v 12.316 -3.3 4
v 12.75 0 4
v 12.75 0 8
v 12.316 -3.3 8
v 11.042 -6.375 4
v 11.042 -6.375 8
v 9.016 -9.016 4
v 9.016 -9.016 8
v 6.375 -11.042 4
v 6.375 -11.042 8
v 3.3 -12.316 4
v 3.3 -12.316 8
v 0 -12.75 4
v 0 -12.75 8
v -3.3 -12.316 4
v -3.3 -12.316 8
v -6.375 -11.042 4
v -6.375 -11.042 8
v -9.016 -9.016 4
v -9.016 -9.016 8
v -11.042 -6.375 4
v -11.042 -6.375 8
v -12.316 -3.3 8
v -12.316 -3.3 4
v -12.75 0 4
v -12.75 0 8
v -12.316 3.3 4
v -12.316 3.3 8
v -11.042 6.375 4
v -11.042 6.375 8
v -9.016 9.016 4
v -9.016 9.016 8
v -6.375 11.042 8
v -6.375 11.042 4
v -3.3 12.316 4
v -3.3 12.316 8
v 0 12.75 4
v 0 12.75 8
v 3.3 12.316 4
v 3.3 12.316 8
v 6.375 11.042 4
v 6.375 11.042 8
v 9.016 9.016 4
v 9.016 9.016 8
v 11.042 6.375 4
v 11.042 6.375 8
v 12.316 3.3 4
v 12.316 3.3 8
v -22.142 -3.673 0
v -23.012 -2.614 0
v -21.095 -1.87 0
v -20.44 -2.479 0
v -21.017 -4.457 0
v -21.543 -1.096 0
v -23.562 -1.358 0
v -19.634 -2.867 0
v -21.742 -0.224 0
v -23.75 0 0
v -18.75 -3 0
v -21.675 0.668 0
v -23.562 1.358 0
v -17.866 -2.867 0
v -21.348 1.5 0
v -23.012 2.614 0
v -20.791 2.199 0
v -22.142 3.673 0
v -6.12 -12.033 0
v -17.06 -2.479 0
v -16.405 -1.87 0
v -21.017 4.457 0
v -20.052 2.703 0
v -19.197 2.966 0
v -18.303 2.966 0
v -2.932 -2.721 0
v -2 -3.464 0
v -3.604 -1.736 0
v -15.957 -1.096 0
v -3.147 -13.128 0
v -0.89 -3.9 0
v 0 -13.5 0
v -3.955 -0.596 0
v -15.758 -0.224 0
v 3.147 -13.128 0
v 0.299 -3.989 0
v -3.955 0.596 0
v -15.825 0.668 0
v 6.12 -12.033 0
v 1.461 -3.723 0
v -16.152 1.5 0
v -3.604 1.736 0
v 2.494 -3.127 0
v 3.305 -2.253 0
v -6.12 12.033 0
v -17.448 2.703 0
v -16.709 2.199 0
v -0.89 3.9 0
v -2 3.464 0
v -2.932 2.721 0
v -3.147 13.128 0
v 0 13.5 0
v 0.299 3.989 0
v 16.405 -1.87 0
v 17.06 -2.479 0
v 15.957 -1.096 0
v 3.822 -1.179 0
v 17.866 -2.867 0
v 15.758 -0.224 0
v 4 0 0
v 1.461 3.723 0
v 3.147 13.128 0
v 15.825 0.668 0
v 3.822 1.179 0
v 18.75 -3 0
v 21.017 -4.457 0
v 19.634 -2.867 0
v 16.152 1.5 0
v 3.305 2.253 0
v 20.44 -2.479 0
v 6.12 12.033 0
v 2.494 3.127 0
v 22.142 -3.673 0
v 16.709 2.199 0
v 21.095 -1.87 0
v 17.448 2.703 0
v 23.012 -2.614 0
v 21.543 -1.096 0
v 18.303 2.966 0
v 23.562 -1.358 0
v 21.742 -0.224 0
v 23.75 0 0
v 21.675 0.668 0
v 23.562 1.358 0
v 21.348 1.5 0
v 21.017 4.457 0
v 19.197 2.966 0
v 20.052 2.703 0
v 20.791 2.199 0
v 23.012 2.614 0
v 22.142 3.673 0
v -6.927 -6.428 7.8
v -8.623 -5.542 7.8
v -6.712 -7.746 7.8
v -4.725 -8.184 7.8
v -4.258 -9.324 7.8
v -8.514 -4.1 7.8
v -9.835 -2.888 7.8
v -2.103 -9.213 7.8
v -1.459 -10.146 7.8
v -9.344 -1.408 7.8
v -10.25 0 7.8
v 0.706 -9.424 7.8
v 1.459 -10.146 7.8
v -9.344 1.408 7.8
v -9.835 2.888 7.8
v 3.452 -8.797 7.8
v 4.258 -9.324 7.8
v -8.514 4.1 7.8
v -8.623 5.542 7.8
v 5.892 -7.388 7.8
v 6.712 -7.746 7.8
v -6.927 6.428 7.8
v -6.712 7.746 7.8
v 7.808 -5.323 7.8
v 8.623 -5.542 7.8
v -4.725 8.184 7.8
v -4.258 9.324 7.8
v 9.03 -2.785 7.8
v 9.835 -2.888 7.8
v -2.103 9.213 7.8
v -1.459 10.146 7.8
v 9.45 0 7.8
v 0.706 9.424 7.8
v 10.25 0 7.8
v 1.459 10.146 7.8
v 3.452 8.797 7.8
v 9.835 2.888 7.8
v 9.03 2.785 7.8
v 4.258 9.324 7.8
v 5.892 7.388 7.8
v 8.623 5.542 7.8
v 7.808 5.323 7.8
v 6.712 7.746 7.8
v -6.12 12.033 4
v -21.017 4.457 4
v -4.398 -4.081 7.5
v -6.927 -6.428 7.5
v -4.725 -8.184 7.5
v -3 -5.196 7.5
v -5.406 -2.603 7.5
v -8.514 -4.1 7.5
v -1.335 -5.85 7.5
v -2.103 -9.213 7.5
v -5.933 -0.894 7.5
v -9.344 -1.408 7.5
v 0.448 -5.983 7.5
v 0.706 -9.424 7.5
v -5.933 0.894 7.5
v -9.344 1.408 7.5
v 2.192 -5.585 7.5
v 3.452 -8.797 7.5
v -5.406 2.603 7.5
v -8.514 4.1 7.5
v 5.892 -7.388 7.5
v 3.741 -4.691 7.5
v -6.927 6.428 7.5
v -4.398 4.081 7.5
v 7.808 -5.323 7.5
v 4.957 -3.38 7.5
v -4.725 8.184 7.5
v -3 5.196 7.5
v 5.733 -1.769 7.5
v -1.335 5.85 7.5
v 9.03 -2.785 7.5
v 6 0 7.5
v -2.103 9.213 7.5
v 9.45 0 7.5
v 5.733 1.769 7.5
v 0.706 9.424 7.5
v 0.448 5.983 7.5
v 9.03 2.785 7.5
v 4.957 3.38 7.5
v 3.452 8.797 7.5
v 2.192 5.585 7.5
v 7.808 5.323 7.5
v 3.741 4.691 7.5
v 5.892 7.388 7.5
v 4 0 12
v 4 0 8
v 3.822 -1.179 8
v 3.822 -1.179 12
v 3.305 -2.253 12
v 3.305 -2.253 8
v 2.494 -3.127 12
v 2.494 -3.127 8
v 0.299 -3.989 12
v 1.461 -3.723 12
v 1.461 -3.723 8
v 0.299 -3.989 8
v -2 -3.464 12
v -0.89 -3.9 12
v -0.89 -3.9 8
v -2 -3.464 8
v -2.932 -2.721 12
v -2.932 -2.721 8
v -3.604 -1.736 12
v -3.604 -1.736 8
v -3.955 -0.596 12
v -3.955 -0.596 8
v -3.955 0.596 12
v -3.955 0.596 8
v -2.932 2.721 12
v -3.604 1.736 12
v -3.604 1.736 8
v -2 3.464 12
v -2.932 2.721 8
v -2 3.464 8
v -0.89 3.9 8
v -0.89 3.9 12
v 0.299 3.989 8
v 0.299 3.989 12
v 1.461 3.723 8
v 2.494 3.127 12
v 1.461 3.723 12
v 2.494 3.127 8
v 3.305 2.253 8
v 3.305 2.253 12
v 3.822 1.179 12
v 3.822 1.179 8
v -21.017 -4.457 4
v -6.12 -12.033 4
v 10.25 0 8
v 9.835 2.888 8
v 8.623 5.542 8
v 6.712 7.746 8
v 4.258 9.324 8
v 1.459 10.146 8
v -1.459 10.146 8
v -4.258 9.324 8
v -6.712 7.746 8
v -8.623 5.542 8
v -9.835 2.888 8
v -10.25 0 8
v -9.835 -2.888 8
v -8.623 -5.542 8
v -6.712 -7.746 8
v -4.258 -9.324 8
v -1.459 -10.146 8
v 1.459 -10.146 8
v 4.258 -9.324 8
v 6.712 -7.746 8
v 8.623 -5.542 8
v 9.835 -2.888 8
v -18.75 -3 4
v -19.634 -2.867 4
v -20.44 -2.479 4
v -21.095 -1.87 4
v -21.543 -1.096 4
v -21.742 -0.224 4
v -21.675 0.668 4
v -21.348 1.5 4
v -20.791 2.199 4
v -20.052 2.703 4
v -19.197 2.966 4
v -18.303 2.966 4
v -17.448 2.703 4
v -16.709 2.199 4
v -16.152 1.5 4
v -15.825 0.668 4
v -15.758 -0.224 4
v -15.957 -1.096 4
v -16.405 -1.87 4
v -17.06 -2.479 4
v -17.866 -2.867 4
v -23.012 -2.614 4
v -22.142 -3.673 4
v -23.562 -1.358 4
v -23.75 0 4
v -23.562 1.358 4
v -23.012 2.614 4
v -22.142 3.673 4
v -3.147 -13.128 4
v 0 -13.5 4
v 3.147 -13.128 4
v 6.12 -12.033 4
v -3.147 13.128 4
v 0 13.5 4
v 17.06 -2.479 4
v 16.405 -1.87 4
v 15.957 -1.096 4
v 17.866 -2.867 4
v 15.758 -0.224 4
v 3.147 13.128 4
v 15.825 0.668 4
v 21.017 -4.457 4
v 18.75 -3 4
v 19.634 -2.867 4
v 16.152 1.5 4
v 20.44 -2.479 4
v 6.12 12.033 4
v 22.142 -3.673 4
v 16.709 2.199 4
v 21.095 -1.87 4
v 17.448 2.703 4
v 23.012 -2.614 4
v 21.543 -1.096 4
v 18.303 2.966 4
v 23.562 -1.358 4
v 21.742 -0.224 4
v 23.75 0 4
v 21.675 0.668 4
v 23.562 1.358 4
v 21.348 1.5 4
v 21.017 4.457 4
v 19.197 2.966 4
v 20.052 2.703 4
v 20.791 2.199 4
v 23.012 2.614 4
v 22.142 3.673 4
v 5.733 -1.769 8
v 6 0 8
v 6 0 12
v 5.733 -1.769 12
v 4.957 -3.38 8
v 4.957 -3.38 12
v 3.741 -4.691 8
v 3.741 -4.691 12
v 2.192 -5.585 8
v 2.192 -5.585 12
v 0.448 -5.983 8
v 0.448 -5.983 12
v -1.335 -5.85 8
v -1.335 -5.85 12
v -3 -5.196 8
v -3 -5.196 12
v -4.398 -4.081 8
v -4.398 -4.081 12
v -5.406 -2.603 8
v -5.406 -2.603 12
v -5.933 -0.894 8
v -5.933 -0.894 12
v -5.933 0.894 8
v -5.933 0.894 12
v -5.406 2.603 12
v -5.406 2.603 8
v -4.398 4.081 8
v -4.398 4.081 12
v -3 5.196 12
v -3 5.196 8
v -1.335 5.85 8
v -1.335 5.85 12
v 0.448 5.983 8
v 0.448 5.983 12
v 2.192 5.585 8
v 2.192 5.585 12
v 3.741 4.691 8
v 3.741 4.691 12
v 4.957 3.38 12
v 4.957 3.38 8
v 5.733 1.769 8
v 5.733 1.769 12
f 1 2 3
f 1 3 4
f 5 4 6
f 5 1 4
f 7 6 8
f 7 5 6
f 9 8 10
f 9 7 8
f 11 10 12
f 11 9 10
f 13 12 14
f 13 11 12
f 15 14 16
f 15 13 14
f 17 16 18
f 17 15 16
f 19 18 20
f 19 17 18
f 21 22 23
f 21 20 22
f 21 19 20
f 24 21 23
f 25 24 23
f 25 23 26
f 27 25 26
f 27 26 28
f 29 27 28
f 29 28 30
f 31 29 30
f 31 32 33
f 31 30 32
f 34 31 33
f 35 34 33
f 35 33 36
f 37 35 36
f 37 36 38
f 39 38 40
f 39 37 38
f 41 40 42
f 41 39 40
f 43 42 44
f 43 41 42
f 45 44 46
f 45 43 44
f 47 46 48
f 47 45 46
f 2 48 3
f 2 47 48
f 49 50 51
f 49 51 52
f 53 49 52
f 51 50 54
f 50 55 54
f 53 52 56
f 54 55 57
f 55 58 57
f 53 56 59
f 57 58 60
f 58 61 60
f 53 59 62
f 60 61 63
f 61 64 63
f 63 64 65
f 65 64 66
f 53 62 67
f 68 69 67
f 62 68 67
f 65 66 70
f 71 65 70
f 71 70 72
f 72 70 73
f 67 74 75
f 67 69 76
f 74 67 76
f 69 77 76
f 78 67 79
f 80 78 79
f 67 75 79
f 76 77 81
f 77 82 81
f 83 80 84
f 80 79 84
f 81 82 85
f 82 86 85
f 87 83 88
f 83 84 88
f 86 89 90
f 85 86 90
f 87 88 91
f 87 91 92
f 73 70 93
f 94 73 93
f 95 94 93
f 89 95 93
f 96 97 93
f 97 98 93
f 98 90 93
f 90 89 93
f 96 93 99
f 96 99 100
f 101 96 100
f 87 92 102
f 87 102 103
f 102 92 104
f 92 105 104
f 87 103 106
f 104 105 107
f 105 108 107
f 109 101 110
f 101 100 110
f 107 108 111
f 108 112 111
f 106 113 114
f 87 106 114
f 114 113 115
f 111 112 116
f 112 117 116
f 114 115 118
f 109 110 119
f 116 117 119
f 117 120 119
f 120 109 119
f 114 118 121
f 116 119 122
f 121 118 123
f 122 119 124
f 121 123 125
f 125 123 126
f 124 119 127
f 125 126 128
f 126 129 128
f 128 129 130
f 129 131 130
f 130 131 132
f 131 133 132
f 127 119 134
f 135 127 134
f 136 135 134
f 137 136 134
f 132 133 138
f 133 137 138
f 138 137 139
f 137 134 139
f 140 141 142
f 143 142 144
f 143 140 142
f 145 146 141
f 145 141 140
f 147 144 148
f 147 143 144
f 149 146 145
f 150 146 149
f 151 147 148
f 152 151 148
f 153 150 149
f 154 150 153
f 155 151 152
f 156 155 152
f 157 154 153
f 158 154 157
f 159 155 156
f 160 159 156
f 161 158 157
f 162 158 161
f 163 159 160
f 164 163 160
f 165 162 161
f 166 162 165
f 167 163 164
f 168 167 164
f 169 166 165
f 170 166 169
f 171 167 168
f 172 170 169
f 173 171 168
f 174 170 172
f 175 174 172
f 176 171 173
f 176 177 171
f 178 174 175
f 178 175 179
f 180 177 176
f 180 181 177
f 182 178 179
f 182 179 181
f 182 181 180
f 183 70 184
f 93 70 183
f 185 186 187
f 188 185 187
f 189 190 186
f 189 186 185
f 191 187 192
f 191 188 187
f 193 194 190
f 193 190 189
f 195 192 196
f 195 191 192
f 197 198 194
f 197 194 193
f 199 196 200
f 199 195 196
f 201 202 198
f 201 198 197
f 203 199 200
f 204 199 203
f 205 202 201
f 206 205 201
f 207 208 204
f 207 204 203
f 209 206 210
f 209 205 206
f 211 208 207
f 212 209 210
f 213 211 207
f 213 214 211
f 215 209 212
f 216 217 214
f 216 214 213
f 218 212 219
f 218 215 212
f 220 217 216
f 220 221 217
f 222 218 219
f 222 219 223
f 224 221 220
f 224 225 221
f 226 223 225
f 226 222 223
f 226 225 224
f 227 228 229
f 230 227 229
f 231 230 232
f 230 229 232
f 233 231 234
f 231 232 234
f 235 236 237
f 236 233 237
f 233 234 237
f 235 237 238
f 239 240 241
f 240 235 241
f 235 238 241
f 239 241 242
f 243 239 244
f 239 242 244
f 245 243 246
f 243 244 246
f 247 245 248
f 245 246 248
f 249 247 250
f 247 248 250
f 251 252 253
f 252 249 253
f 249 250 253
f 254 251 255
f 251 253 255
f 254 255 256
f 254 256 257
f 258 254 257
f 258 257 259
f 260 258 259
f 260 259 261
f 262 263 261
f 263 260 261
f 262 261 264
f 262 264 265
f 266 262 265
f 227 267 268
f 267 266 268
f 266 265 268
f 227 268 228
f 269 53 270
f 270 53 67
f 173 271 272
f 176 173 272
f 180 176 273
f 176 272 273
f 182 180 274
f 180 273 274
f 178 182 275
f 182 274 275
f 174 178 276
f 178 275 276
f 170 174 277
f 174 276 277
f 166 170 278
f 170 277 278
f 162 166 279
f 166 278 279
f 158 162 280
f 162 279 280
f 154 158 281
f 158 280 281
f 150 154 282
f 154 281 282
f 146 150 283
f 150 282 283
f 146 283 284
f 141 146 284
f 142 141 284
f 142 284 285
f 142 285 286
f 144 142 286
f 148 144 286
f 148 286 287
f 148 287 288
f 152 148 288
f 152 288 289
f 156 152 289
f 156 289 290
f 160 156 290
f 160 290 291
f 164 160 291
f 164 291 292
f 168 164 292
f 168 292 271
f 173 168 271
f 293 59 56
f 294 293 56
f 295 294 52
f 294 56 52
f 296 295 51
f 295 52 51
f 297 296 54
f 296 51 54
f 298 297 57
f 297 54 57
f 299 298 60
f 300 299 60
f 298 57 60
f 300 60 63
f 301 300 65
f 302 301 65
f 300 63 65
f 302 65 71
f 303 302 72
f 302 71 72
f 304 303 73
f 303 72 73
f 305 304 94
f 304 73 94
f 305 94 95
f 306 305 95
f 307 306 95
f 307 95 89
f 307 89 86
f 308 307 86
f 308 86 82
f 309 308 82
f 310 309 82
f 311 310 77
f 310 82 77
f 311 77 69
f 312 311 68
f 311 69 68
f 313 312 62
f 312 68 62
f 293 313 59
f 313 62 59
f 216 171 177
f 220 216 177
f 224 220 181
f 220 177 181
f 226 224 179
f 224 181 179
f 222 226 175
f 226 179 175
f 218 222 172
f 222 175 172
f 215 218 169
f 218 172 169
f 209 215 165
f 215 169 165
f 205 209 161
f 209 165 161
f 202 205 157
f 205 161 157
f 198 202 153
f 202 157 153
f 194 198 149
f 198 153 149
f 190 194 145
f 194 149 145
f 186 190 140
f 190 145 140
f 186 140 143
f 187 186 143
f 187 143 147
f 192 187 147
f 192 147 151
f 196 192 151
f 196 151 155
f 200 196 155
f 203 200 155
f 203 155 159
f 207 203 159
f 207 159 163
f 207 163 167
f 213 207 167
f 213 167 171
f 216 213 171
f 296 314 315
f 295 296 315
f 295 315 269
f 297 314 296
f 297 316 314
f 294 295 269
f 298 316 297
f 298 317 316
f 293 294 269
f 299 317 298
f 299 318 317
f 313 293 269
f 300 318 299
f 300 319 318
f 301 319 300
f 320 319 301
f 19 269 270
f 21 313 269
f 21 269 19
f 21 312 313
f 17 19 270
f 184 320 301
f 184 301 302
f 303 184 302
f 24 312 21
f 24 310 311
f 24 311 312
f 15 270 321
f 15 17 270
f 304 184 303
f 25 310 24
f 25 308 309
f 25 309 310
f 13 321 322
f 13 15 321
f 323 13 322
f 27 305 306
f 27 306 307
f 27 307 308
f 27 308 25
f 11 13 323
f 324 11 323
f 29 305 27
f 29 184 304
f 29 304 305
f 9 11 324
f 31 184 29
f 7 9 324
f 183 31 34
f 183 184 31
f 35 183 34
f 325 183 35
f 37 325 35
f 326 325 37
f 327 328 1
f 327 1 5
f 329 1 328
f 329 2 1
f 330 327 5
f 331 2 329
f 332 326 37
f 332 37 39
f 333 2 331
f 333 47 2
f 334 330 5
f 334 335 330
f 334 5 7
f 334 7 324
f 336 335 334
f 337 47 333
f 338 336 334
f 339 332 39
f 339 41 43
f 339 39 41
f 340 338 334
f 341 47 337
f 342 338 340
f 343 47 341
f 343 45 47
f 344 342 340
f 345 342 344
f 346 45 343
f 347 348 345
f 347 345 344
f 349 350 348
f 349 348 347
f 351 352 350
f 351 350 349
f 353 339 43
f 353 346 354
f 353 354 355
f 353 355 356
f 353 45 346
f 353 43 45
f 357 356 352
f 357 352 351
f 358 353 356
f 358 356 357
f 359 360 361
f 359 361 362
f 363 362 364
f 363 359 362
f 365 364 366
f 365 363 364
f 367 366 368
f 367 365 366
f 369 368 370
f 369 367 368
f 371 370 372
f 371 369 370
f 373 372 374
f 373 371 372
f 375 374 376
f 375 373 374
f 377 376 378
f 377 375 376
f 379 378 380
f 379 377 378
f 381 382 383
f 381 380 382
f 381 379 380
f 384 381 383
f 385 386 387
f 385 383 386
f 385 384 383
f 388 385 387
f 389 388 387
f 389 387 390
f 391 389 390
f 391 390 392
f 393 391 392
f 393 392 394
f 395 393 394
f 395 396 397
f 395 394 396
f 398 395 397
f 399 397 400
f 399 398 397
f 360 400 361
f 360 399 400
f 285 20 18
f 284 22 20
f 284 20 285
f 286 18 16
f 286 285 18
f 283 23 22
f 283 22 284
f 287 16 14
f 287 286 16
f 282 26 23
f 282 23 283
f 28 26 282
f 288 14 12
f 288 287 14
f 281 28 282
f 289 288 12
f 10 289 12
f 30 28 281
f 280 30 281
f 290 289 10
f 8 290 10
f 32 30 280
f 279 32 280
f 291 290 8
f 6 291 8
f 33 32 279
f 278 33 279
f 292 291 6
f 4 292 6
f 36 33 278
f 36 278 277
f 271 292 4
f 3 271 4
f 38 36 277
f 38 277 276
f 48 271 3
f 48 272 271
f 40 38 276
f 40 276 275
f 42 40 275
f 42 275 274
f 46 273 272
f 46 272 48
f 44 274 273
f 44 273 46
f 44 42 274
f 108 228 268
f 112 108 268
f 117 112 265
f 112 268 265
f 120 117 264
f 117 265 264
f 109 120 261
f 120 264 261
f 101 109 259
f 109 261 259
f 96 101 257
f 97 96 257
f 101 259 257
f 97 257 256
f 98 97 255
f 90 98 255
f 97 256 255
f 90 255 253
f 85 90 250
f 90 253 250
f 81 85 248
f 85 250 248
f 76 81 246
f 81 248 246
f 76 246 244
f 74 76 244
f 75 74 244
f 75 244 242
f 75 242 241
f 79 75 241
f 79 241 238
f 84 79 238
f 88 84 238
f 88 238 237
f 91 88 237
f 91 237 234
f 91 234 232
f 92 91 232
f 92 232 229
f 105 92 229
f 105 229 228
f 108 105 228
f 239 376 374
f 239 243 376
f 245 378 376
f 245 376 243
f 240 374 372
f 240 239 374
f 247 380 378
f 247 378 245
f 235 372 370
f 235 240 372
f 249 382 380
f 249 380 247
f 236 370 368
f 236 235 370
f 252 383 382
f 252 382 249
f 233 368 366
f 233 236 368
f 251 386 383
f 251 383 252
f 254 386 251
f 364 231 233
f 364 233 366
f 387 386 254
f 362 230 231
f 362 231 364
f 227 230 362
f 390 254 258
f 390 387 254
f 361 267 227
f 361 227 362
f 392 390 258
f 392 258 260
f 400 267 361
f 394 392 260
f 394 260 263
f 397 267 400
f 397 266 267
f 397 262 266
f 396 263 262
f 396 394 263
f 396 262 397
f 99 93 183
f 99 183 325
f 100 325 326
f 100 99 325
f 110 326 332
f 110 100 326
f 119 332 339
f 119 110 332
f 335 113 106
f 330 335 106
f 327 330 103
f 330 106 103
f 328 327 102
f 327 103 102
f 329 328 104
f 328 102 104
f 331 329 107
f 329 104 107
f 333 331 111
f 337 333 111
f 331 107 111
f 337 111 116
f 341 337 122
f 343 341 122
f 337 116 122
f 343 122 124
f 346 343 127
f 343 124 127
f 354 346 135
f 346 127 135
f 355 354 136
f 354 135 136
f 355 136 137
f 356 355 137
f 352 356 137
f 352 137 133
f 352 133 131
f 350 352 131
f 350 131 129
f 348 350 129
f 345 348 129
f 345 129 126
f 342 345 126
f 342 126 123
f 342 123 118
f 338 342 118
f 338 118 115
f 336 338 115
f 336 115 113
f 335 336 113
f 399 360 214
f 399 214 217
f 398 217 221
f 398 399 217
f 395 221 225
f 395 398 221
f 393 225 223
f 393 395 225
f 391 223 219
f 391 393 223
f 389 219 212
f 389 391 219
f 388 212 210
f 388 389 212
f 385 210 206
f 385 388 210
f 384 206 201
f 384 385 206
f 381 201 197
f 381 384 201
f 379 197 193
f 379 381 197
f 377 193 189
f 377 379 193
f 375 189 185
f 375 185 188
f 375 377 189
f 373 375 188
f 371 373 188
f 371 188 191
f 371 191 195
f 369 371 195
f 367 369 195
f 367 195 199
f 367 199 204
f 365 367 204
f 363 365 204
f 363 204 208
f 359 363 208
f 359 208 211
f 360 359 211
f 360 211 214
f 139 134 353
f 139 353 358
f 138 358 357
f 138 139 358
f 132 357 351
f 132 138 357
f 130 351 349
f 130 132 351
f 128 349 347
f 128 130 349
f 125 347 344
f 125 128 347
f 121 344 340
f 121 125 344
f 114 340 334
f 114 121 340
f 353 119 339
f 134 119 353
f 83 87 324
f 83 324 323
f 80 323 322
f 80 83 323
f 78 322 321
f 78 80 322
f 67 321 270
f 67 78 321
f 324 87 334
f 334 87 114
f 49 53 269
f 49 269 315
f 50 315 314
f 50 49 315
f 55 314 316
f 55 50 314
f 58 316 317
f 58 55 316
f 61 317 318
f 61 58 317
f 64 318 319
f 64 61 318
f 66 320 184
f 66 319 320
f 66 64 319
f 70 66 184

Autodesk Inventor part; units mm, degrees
ref_plane "YZ Plane" through (0, 0, 0) normal (1, 0, 0) x (0, 1, 0)
ref_plane "XZ Plane" through (0, 0, 0) normal (0, 1, 0) x (-1, 0, 0)
ref_plane "XY Plane" through (0, 0, 0) normal (0, 0, 1) x (1, 0, 0)
sketch "Szkic1" plane through (0, 0, 0) normal (0, 0, 1) x (1, 0, 0)
  arc A0 (21.0167, -4.4567) -> (21.0167, 4.4567) centre (18.75, 0) ccw
  arc A1 (-21.0167, 4.4567) -> (-21.0167, -4.4567) centre (-18.75, 0) ccw
  line L0 (6.12, -12.0331) -> (21.0167, -4.4567)
  line L1 (6.12, 12.0331) -> (21.0167, 4.4567)
  line L2 (-21.0167, 4.4567) -> (-6.12, 12.0331)
  line L3 (-21.0167, -4.4567) -> (-6.12, -12.0331)
  arc A2 (-6.12, -12.0331) -> (6.12, -12.0331) centre (0, 0) ccw
  arc A3 (6.12, 12.0331) -> (-6.12, 12.0331) centre (0, 0) ccw
  dimension "d3" = 10
  dimension "d4" = 10
  dimension "d5" = 37.5
  dimension "d6" = 18.75
  dimension "d7" = 0
extrude "Wyciągnięcie proste1" add sketch "Szkic1" along normal blind 4
sketch "Szkic2" plane through (0, 0, 4) normal (0, 0, 1) x (1, 0, 0)
  arc A0 (-21.0167, 4.4567) -> (-21.0167, -4.4567) centre (-18.75, 0) ccw projected
  line L0 (6.12, -12.0331) -> (21.0167, -4.4567) projected
  arc A1 (21.0167, -4.4567) -> (21.0167, 4.4567) centre (18.75, 0) ccw projected
  line L1 (21.0167, 4.4567) -> (6.12, 12.0331) projected
  arc A2 (6.12, 12.0331) -> (-6.12, 12.0331) centre (0, 0) ccw projected
  line L2 (-6.12, 12.0331) -> (-21.0167, 4.4567) projected
  arc A3 (-21.0167, 4.4567) -> (-21.0167, -4.4567) centre (-18.75, 0) ccw projected
  line L3 (-21.0167, -4.4567) -> (-6.12, -12.0331) projected
  arc A4 (-6.12, -12.0331) -> (6.12, -12.0331) centre (0, 0) ccw projected
  circle A5 centre (0, 0) radius 12.75
  dimension "d10" = 25.5
extrude "Wyciągnięcie proste2" add sketch "Szkic2" along normal blind 4 contours A5
hole "Otwór1" at (18.75, 0, 4) at (-18.75, 0, 4) direction (0, 0, -1) diameter 6 end through all
sketch "Szkic3" plane through (0, 0, 8) normal (0, 0, 1) x (1, 0, 0)
  circle A0 centre (0, 0) radius 10.25
  circle A1 centre (0, 0) radius 9.45
  circle A2 centre (0, 0) radius 6
  circle A3 centre (0, 0) radius 4
  dimension "d20" = 20.5
  dimension "d21" = 0.8
  dimension "d22" = 12
  dimension "d23" = 2
extrude "Wyciągnięcie proste3" cut sketch "Szkic3" against normal blind 0.2 contours A0
extrude "Wyciągnięcie proste4" cut sketch "Szkic3" against normal blind 0.5 contours A1
extrude "Wyciągnięcie proste5" cut sketch "Szkic3" against normal up to surface (8 mm away) contours A3
extrude "Wyciągnięcie proste6" add sketch "Szkic3" along normal blind 4 contours A2
equation "\"d6\" = 0.5 * d5"
properties part number "COTS_GENERIC_8mm_Dia_Ball_Screw_Top_Bearing_Block" material "Tworzywo sztuczne LCP"
